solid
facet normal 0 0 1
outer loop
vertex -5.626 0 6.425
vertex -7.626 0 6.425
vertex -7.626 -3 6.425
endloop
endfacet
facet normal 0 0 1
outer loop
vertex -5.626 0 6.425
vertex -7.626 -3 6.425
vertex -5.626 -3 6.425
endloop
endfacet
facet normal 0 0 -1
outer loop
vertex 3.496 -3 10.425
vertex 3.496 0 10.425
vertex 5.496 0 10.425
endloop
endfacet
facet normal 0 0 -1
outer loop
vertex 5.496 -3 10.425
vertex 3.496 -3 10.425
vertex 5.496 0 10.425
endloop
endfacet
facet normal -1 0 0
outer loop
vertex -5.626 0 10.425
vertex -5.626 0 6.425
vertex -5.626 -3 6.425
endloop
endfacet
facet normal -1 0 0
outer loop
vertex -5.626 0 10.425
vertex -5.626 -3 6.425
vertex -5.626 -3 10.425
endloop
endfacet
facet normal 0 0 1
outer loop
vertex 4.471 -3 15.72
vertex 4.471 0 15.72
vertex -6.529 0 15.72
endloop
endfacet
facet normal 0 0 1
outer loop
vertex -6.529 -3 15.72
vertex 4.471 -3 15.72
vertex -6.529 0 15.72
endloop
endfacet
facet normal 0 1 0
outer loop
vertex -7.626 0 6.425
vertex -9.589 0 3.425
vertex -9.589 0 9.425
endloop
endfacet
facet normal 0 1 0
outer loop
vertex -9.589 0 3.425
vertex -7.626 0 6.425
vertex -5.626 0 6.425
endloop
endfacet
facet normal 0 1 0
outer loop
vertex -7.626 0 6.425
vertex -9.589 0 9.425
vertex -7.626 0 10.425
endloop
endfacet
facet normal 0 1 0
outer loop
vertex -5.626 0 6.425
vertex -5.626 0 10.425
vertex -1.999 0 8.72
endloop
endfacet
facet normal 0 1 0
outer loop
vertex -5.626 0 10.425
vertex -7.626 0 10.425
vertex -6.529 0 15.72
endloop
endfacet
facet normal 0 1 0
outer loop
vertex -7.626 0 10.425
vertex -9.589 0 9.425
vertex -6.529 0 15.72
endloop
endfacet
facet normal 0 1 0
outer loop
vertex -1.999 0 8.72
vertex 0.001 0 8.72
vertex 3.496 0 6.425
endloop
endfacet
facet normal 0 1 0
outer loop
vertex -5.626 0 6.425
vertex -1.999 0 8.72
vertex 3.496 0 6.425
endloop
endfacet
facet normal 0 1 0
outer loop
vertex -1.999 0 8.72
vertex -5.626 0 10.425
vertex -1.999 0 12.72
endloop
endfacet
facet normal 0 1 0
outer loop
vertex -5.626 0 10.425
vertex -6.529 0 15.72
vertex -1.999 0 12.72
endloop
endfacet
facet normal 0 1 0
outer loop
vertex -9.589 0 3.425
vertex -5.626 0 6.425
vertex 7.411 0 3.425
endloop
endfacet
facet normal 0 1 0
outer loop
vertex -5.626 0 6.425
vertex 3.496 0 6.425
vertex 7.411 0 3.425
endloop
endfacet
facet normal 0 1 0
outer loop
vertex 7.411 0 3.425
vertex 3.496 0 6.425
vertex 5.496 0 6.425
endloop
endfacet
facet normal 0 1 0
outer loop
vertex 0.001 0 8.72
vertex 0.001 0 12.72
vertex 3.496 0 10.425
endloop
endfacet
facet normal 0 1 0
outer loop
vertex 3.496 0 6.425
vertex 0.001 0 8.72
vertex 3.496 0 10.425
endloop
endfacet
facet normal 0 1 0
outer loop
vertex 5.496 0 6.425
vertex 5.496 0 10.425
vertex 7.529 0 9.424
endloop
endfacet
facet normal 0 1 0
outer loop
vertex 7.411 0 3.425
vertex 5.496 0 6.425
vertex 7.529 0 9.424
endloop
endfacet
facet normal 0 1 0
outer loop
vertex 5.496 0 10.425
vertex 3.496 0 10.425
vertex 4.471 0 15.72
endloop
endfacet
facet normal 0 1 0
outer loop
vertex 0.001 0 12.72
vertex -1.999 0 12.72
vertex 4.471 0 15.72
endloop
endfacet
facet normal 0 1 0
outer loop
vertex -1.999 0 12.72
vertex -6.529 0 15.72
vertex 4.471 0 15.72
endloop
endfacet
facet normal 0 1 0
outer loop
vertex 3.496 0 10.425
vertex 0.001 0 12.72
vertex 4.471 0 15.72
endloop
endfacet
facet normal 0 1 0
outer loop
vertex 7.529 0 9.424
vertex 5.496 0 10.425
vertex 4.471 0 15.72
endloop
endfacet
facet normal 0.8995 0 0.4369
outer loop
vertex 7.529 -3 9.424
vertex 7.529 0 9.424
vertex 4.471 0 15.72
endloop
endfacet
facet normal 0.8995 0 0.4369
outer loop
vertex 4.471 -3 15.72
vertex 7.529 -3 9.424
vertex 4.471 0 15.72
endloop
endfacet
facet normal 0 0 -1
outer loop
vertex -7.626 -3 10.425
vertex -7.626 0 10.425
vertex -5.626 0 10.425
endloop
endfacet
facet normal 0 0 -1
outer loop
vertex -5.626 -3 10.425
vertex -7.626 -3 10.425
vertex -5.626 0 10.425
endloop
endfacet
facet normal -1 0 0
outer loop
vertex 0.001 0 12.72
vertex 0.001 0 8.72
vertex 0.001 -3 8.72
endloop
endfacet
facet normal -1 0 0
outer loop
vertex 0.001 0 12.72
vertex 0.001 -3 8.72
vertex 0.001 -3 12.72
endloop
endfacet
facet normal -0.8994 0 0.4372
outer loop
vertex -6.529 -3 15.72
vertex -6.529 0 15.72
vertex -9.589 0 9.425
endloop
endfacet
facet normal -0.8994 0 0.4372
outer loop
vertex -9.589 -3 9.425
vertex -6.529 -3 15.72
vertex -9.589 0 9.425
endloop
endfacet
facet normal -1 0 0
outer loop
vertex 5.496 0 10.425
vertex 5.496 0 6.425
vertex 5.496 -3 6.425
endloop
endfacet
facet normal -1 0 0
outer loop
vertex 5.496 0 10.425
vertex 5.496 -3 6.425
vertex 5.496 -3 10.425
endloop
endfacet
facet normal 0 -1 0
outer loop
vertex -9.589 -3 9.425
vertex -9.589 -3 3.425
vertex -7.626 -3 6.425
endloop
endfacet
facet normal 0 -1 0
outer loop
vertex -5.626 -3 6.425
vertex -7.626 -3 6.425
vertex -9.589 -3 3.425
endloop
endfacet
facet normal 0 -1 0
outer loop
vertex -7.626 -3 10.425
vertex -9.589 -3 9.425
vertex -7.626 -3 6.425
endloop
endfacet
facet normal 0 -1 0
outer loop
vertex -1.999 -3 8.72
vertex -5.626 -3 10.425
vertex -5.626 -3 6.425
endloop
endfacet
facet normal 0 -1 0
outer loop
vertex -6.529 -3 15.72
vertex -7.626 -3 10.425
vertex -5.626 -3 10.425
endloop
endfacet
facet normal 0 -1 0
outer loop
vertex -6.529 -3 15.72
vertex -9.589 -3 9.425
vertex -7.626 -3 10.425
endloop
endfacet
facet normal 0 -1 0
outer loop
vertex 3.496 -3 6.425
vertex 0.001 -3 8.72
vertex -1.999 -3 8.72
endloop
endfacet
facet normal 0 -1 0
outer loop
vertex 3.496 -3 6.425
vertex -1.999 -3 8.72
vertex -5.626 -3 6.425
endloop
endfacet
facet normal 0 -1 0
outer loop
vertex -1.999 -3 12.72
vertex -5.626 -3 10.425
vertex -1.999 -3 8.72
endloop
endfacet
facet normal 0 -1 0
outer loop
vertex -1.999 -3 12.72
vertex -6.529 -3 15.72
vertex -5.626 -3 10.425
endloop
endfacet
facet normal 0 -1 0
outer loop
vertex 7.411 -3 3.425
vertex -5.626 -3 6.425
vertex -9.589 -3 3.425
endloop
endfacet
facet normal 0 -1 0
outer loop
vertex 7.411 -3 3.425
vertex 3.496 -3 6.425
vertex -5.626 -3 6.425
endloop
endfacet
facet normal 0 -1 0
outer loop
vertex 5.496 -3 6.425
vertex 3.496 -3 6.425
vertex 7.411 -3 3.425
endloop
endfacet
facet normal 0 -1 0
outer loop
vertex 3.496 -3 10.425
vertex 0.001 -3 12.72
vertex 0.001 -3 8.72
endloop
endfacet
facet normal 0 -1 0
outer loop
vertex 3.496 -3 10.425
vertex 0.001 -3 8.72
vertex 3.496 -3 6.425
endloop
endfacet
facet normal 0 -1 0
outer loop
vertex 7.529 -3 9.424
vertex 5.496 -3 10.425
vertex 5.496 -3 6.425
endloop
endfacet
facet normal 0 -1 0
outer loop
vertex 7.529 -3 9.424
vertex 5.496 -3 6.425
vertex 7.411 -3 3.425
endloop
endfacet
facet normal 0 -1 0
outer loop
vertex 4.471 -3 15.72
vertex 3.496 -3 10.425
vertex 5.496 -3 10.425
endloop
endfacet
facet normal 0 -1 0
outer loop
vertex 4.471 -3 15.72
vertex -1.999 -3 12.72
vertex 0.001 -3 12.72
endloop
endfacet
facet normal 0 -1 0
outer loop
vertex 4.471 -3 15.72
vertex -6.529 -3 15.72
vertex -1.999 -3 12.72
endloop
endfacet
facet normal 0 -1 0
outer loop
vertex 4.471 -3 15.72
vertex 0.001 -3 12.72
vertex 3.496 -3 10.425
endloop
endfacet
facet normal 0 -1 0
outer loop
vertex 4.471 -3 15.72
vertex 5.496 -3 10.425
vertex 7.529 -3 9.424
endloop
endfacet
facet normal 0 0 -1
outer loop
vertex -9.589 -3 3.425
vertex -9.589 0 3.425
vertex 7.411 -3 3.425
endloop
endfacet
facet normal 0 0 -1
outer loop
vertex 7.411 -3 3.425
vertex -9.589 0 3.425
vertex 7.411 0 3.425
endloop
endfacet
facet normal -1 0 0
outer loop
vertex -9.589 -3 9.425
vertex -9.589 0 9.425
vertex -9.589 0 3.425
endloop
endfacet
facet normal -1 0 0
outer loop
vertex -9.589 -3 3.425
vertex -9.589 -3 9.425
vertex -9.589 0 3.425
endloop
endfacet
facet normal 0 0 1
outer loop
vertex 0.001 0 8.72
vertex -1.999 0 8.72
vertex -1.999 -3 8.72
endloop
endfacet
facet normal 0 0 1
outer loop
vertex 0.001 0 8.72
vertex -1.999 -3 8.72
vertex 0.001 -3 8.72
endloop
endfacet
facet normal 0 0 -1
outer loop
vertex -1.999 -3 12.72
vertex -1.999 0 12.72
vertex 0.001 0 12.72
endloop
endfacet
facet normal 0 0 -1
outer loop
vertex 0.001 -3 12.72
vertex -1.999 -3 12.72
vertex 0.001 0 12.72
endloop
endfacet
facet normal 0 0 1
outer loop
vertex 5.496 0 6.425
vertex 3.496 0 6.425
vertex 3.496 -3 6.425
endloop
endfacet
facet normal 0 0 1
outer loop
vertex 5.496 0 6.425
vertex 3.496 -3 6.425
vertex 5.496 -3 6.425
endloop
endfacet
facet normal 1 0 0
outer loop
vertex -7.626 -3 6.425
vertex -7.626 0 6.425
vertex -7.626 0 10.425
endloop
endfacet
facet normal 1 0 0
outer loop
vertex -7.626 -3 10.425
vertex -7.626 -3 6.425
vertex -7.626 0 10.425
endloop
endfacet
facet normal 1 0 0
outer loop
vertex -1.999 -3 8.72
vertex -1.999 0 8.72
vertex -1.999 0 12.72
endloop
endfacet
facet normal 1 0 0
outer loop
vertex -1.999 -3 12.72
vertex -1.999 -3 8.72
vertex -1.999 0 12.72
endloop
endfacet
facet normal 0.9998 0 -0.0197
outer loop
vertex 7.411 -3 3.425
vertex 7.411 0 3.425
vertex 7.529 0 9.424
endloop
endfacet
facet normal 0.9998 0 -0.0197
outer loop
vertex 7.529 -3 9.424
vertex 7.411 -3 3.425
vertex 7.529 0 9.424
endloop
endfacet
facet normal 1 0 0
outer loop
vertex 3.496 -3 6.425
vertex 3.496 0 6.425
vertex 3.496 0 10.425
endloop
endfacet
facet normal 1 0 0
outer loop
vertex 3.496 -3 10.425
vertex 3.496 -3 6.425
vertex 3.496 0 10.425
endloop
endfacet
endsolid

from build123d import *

# Parameters (mm, degrees)
F2_DEPTH = 3
F1_W     = 2
F1_H     = 4
F3_DEPTH = 3


with BuildPart() as f2:
    # F0 (on Front) → F2 (new body)
    with BuildSketch(Plane.XZ):
        Polygon((4.470963, 15.720311), (-6.529037, 15.720311), (-9.589446, 9.424765), (-9.589446, 3.424765), (7.410554, 3.424765), (7.528967, 9.423597), align=None)
    extrude(amount=F2_DEPTH)

    # F1 (on Front) → F3 (cut)
    with BuildSketch(Plane.XZ):
        with Locations((4.495724, 8.424765)):
            Rectangle(F1_W, F1_H)
        with Locations((-0.999158, 10.720311)):
            Rectangle(F1_W, F1_H)
        with Locations((-6.626463, 8.424765)):
            Rectangle(F1_W, F1_H)
    extrude(amount=F3_DEPTH, mode=Mode.SUBTRACT)


solid = f2.part
